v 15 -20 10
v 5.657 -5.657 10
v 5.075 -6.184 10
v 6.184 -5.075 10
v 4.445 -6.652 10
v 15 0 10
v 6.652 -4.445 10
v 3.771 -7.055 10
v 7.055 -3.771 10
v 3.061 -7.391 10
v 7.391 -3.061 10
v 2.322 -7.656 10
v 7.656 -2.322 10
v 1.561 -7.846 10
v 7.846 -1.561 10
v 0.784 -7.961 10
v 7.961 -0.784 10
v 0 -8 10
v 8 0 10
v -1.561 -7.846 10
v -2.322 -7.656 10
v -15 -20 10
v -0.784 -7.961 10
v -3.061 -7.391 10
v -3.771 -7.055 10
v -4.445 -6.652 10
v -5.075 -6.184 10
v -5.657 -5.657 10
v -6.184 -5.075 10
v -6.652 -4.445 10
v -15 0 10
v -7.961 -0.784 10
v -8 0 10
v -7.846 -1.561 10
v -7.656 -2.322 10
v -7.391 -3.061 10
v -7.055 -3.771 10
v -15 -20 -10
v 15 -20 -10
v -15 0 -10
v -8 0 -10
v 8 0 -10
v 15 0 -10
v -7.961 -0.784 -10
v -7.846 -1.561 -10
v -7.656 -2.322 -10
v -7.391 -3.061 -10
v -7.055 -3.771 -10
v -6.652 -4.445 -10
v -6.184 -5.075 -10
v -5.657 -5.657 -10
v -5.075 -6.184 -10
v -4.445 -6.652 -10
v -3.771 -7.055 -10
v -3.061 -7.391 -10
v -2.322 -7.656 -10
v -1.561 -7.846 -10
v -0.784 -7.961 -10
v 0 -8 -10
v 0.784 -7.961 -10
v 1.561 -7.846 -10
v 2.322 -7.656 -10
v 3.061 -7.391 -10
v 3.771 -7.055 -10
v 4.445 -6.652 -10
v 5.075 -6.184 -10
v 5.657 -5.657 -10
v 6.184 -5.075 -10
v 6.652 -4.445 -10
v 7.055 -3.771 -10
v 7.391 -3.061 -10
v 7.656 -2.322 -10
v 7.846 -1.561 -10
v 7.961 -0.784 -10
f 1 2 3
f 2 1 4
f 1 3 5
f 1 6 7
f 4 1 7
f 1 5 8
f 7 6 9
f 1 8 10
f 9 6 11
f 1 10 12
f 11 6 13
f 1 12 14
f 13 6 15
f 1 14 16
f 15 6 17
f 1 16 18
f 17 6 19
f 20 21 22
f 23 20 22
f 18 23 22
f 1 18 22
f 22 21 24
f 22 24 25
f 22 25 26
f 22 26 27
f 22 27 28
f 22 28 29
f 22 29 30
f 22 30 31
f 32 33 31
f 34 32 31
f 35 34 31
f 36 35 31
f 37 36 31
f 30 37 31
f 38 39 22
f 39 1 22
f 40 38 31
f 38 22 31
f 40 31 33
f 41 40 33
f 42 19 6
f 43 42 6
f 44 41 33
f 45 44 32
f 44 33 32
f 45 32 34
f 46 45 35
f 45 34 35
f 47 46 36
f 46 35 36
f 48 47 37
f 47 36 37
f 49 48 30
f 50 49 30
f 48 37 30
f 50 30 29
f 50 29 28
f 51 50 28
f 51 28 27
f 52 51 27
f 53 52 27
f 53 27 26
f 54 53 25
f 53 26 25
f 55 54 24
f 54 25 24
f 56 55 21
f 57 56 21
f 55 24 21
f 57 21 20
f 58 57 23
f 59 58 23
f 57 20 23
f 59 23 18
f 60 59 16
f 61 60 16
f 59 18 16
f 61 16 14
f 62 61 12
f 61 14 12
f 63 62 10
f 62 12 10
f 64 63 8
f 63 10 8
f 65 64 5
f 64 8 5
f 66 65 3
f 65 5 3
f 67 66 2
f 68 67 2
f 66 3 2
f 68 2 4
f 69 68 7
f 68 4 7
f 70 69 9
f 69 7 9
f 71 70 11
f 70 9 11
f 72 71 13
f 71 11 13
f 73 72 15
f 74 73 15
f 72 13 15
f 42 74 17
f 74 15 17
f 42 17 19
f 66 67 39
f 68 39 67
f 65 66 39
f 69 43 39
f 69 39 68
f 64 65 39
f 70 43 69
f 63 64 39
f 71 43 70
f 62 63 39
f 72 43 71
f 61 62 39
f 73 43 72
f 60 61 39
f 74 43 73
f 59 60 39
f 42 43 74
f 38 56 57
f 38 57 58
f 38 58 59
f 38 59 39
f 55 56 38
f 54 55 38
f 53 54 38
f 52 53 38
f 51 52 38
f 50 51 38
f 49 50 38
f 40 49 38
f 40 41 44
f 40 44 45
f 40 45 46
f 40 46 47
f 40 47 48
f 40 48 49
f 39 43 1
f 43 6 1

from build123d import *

# Parameters (mm, degrees)
BOSS_EXTRUDE1_DEPTH = 10


with BuildPart() as part:
    # Sketch1 → Boss-Extrude1 (new, symmetric)
    with BuildSketch(Plane.XY):
        with BuildLine():
            Line((8, 0), (15, 0))
            Line((15, 0), (15, -20))
            Line((15, -20), (-15, -20))
            Line((-15, -20), (-15, 0))
            Line((-15, 0), (-8, 0))
            ThreePointArc((-8, 0), (0, -8), (8, 0))
        make_face()
    extrude(amount=BOSS_EXTRUDE1_DEPTH, both=True)


solid = part.part
